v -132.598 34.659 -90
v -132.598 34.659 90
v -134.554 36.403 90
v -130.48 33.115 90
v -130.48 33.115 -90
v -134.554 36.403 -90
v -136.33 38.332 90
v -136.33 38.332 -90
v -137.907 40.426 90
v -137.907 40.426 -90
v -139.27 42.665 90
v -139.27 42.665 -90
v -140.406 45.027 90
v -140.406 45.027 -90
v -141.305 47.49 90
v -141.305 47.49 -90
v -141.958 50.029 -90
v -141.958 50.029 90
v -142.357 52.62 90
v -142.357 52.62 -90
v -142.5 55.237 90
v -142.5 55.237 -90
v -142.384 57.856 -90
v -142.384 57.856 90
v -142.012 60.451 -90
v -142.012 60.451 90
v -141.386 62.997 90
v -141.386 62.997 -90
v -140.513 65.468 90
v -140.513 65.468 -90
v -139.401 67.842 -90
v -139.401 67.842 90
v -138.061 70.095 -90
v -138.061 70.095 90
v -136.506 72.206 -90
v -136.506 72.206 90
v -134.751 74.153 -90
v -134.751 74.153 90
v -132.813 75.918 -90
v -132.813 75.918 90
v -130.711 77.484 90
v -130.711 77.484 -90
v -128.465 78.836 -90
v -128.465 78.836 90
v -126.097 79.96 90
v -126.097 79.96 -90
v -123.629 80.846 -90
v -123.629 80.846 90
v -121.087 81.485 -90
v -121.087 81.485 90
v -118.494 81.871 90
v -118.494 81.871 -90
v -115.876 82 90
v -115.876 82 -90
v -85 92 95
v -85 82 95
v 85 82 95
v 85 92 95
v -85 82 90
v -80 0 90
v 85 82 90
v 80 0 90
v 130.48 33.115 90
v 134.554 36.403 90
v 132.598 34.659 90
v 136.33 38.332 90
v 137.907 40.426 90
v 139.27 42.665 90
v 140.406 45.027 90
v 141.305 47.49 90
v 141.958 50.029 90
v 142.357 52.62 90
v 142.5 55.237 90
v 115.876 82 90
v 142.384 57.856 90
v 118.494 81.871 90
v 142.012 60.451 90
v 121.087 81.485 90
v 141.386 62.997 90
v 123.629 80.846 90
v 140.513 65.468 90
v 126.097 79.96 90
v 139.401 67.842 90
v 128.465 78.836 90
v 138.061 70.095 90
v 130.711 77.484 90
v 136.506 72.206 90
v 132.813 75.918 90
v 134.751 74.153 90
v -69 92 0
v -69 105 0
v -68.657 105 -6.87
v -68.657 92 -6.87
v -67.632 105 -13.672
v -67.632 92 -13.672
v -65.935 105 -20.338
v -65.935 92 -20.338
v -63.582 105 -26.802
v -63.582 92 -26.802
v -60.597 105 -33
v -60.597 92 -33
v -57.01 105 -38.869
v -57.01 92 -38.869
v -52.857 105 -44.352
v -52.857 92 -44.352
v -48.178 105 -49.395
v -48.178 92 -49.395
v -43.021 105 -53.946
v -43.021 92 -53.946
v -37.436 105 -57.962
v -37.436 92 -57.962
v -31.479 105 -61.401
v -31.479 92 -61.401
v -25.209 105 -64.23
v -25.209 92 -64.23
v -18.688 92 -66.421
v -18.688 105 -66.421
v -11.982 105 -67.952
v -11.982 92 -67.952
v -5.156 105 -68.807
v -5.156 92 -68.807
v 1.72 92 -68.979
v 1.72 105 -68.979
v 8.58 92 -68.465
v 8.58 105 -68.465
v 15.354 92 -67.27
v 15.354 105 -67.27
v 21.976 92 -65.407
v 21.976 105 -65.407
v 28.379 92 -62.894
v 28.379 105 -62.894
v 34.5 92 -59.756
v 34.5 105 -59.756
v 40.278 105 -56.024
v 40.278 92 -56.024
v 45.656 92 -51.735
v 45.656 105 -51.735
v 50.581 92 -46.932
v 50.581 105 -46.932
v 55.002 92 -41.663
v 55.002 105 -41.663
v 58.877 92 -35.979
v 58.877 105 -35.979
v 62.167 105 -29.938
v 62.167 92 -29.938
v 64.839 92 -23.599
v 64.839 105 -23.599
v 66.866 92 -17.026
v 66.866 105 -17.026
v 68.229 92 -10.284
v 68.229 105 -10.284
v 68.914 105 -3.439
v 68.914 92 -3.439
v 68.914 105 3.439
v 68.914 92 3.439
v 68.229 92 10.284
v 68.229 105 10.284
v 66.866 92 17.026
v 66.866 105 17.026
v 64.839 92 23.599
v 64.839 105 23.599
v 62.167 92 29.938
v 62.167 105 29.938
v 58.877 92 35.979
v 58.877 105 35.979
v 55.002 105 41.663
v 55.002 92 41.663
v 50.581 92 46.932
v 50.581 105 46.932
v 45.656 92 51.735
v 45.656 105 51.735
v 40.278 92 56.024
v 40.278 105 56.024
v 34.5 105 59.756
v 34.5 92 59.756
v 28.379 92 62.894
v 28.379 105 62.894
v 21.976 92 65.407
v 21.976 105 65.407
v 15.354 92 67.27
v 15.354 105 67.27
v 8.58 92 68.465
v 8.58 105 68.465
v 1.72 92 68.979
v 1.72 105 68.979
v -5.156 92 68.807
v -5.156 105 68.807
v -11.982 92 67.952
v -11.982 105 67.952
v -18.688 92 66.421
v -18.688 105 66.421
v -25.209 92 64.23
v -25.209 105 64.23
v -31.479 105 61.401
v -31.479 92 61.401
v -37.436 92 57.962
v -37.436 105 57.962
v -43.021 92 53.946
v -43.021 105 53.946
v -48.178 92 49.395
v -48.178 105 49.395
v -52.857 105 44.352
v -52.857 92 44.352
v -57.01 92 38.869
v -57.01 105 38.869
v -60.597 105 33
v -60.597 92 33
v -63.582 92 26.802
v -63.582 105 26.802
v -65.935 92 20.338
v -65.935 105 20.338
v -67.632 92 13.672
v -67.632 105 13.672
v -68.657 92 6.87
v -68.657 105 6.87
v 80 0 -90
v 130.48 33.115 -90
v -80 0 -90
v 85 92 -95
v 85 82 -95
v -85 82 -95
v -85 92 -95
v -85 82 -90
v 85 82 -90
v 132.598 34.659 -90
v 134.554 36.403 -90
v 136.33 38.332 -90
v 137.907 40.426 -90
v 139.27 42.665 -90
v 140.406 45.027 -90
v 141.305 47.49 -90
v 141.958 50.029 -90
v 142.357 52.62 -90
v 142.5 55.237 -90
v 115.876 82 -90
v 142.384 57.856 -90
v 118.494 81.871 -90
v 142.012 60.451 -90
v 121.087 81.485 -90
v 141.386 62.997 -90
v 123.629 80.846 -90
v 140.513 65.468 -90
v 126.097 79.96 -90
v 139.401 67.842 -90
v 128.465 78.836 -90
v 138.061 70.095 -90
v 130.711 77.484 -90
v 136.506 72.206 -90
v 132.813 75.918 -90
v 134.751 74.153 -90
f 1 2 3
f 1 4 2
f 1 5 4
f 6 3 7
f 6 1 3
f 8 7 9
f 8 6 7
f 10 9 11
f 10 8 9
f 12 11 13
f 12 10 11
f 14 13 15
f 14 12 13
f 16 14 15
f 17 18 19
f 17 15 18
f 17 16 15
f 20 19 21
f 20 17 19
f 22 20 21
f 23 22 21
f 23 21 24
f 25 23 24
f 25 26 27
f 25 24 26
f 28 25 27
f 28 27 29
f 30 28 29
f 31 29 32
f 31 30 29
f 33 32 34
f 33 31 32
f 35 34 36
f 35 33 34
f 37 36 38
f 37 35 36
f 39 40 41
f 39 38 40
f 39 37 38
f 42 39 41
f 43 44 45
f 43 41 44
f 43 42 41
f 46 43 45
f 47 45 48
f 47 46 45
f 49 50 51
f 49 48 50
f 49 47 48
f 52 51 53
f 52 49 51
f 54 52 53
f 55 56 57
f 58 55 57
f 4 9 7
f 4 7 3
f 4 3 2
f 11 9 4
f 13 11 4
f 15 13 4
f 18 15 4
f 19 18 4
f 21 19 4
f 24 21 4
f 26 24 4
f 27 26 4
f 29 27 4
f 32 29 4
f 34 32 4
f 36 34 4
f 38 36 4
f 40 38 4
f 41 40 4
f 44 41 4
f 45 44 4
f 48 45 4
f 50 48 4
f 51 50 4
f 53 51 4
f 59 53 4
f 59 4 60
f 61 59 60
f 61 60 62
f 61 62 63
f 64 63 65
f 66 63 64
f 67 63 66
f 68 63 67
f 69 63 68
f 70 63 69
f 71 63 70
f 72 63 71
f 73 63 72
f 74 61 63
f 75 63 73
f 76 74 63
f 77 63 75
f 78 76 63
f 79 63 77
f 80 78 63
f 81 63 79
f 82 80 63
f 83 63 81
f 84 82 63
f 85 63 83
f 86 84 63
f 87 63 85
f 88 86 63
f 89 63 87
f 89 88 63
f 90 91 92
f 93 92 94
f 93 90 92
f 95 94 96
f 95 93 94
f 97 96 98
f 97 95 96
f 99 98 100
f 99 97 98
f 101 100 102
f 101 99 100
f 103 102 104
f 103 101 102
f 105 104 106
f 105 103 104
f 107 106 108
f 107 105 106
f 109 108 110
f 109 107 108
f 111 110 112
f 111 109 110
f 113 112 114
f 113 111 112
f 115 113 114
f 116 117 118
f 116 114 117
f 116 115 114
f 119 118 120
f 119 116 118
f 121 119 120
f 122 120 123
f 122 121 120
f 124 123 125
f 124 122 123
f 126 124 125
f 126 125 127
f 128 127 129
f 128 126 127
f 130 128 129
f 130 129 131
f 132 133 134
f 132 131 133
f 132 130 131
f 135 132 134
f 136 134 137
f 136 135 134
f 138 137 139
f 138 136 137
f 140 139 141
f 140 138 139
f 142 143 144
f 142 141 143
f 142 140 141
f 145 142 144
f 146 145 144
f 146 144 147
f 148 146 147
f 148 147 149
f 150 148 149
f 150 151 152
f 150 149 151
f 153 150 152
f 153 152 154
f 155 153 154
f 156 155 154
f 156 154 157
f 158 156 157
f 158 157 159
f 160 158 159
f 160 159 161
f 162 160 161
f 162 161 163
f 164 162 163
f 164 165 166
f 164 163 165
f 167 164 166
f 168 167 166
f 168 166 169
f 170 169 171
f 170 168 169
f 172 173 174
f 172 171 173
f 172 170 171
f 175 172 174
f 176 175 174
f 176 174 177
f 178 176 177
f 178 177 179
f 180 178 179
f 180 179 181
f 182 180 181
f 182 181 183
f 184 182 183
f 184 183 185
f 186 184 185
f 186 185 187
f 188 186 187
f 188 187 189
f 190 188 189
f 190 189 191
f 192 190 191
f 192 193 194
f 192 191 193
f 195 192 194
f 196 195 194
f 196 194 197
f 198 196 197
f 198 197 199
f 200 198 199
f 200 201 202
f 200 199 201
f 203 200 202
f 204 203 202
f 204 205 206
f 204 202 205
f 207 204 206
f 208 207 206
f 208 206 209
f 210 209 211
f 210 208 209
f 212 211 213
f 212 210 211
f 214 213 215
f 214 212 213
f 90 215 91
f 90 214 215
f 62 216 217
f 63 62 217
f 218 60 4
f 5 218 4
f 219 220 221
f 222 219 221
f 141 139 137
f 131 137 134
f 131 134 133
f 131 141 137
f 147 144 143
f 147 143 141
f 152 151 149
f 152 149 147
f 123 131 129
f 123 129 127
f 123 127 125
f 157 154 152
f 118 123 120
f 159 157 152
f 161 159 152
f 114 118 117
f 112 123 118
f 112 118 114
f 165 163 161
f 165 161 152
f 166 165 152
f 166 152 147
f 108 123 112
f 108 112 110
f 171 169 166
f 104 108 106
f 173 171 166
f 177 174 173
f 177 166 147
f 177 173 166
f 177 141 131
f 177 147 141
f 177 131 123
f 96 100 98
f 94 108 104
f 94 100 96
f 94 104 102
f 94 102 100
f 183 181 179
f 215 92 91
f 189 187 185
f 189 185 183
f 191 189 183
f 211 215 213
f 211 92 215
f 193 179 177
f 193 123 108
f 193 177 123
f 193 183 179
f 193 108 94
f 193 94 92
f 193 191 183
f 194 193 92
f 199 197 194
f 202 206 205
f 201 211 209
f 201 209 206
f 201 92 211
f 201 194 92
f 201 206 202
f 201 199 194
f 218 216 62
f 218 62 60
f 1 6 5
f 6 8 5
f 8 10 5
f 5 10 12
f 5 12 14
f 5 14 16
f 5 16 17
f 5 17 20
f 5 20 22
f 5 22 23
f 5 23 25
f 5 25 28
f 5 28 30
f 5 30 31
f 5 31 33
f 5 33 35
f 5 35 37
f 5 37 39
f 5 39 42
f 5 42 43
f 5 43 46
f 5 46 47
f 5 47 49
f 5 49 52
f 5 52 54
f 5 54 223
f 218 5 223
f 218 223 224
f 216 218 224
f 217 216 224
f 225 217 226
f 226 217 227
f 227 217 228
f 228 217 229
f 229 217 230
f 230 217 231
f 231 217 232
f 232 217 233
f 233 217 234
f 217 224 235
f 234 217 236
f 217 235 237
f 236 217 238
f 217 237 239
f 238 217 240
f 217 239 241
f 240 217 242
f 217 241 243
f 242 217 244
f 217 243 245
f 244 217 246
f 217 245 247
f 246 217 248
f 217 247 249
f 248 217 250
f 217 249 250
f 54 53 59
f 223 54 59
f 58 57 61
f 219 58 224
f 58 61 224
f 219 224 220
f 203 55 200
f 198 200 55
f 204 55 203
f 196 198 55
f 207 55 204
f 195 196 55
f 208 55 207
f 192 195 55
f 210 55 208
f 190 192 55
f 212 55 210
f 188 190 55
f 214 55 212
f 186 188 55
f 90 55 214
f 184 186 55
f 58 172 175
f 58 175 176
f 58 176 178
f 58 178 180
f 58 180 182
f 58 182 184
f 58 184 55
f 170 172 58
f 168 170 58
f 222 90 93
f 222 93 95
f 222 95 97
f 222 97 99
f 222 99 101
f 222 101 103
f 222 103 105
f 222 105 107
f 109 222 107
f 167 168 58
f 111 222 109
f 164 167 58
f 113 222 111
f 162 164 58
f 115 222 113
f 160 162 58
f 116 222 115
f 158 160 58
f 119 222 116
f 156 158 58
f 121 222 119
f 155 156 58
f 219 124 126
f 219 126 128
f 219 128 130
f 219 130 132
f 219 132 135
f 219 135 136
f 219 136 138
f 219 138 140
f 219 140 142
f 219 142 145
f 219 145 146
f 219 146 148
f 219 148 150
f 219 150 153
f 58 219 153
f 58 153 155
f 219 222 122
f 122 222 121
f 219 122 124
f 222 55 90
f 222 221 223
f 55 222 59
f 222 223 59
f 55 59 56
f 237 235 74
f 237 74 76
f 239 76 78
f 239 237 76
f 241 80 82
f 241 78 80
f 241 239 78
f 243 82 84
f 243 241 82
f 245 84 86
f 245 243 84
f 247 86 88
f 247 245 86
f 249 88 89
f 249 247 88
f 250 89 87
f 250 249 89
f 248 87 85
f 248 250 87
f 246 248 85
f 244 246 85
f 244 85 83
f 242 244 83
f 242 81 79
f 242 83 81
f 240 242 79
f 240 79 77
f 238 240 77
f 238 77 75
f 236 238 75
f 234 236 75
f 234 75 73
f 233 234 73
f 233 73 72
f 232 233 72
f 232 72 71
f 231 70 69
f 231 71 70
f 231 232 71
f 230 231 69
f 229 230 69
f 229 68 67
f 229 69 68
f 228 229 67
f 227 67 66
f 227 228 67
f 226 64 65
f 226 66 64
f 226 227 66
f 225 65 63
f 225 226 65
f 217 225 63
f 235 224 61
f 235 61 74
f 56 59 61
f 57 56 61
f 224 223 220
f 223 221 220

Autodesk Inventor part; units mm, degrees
ref_plane "YZ Plane" through (0, 0, 0) normal (1, 0, 0) x (0, 1, 0)
ref_plane "XZ Plane" through (0, 0, 0) normal (0, 1, 0) x (-1, 0, 0)
ref_plane "XY Plane" through (0, 0, 0) normal (0, 0, 1) x (1, 0, 0)
sketch "Sketch1" plane through (0, 0, 0) normal (0, 0, 1) x (1, 0, 0)
  line L0 (-142.5, 102) -> (142.5, 102) construction
  line L1 (142.5, 102) -> (142.5, 82) construction
  line L2 (142.5, 0) -> (-142.5, 0)
  line L3 (-142.5, 0) -> (-142.5, 82)
  line L4 (-142.5, 82) -> (142.5, 82)
  line L5 (142.5, 82) -> (142.5, 0)
  line L6 (80, 0) -> (142.5, 41)
  circle A0 centre (115.876, 55.376) radius 26.624
  line L7 (-142.5, 82) -> (-142.5, 102) construction
  line L8 (-80, 0) -> (-142.5, 41)
  circle A1 centre (-115.876, 55.376) radius 26.624
  point P0 (0, 0)
  point P1 (0, 0)
  point P2 (-130.4796, 33.1146)
  point P3 (130.4796, 33.1146)
  point P4 (115.876, 82)
  point P5 (-115.876, 82)
  dimension "d7" = 285
  dimension "d8" = 102
  dimension "d9" = 82
  dimension "d13" = 80
  dimension "d14" = 80
extrude "Extrusion1" add sketch "Sketch1" along normal mid plane 180 contours L2 L8 A1 L4 A0 L6 | A0 | A1
sketch "Sketch2" plane through (-115.876, 82, 90) normal (0, 1, 0) x (1, 0, 0)
  line L0 (30.876, -5) -> (200.876, -5)
  line L1 (200.876, -5) -> (200.876, 185)
  line L2 (200.876, 185) -> (30.876, 185)
  line L3 (30.876, 185) -> (30.876, -5)
  line L4 (30.876, -5) -> (200.876, 185) construction
  point P0 (115.876, 90)
  point P1 (115.876, 90)
  dimension "d17" = 190
  dimension "d18" = 170
extrude "Extrusion2" add sketch "Sketch2" along normal blind 10
sketch "Sketch3" plane through (0, 0, 0) normal (0, 1, 0) x (-1, 0, 0)
  circle A0 centre (0, 0) radius 69
  dimension "d21" = 138
extrude "Extrusion3" add sketch "Sketch3" along normal blind 105
equation "\"d14\" = d13"
properties part number "Roller platform"
